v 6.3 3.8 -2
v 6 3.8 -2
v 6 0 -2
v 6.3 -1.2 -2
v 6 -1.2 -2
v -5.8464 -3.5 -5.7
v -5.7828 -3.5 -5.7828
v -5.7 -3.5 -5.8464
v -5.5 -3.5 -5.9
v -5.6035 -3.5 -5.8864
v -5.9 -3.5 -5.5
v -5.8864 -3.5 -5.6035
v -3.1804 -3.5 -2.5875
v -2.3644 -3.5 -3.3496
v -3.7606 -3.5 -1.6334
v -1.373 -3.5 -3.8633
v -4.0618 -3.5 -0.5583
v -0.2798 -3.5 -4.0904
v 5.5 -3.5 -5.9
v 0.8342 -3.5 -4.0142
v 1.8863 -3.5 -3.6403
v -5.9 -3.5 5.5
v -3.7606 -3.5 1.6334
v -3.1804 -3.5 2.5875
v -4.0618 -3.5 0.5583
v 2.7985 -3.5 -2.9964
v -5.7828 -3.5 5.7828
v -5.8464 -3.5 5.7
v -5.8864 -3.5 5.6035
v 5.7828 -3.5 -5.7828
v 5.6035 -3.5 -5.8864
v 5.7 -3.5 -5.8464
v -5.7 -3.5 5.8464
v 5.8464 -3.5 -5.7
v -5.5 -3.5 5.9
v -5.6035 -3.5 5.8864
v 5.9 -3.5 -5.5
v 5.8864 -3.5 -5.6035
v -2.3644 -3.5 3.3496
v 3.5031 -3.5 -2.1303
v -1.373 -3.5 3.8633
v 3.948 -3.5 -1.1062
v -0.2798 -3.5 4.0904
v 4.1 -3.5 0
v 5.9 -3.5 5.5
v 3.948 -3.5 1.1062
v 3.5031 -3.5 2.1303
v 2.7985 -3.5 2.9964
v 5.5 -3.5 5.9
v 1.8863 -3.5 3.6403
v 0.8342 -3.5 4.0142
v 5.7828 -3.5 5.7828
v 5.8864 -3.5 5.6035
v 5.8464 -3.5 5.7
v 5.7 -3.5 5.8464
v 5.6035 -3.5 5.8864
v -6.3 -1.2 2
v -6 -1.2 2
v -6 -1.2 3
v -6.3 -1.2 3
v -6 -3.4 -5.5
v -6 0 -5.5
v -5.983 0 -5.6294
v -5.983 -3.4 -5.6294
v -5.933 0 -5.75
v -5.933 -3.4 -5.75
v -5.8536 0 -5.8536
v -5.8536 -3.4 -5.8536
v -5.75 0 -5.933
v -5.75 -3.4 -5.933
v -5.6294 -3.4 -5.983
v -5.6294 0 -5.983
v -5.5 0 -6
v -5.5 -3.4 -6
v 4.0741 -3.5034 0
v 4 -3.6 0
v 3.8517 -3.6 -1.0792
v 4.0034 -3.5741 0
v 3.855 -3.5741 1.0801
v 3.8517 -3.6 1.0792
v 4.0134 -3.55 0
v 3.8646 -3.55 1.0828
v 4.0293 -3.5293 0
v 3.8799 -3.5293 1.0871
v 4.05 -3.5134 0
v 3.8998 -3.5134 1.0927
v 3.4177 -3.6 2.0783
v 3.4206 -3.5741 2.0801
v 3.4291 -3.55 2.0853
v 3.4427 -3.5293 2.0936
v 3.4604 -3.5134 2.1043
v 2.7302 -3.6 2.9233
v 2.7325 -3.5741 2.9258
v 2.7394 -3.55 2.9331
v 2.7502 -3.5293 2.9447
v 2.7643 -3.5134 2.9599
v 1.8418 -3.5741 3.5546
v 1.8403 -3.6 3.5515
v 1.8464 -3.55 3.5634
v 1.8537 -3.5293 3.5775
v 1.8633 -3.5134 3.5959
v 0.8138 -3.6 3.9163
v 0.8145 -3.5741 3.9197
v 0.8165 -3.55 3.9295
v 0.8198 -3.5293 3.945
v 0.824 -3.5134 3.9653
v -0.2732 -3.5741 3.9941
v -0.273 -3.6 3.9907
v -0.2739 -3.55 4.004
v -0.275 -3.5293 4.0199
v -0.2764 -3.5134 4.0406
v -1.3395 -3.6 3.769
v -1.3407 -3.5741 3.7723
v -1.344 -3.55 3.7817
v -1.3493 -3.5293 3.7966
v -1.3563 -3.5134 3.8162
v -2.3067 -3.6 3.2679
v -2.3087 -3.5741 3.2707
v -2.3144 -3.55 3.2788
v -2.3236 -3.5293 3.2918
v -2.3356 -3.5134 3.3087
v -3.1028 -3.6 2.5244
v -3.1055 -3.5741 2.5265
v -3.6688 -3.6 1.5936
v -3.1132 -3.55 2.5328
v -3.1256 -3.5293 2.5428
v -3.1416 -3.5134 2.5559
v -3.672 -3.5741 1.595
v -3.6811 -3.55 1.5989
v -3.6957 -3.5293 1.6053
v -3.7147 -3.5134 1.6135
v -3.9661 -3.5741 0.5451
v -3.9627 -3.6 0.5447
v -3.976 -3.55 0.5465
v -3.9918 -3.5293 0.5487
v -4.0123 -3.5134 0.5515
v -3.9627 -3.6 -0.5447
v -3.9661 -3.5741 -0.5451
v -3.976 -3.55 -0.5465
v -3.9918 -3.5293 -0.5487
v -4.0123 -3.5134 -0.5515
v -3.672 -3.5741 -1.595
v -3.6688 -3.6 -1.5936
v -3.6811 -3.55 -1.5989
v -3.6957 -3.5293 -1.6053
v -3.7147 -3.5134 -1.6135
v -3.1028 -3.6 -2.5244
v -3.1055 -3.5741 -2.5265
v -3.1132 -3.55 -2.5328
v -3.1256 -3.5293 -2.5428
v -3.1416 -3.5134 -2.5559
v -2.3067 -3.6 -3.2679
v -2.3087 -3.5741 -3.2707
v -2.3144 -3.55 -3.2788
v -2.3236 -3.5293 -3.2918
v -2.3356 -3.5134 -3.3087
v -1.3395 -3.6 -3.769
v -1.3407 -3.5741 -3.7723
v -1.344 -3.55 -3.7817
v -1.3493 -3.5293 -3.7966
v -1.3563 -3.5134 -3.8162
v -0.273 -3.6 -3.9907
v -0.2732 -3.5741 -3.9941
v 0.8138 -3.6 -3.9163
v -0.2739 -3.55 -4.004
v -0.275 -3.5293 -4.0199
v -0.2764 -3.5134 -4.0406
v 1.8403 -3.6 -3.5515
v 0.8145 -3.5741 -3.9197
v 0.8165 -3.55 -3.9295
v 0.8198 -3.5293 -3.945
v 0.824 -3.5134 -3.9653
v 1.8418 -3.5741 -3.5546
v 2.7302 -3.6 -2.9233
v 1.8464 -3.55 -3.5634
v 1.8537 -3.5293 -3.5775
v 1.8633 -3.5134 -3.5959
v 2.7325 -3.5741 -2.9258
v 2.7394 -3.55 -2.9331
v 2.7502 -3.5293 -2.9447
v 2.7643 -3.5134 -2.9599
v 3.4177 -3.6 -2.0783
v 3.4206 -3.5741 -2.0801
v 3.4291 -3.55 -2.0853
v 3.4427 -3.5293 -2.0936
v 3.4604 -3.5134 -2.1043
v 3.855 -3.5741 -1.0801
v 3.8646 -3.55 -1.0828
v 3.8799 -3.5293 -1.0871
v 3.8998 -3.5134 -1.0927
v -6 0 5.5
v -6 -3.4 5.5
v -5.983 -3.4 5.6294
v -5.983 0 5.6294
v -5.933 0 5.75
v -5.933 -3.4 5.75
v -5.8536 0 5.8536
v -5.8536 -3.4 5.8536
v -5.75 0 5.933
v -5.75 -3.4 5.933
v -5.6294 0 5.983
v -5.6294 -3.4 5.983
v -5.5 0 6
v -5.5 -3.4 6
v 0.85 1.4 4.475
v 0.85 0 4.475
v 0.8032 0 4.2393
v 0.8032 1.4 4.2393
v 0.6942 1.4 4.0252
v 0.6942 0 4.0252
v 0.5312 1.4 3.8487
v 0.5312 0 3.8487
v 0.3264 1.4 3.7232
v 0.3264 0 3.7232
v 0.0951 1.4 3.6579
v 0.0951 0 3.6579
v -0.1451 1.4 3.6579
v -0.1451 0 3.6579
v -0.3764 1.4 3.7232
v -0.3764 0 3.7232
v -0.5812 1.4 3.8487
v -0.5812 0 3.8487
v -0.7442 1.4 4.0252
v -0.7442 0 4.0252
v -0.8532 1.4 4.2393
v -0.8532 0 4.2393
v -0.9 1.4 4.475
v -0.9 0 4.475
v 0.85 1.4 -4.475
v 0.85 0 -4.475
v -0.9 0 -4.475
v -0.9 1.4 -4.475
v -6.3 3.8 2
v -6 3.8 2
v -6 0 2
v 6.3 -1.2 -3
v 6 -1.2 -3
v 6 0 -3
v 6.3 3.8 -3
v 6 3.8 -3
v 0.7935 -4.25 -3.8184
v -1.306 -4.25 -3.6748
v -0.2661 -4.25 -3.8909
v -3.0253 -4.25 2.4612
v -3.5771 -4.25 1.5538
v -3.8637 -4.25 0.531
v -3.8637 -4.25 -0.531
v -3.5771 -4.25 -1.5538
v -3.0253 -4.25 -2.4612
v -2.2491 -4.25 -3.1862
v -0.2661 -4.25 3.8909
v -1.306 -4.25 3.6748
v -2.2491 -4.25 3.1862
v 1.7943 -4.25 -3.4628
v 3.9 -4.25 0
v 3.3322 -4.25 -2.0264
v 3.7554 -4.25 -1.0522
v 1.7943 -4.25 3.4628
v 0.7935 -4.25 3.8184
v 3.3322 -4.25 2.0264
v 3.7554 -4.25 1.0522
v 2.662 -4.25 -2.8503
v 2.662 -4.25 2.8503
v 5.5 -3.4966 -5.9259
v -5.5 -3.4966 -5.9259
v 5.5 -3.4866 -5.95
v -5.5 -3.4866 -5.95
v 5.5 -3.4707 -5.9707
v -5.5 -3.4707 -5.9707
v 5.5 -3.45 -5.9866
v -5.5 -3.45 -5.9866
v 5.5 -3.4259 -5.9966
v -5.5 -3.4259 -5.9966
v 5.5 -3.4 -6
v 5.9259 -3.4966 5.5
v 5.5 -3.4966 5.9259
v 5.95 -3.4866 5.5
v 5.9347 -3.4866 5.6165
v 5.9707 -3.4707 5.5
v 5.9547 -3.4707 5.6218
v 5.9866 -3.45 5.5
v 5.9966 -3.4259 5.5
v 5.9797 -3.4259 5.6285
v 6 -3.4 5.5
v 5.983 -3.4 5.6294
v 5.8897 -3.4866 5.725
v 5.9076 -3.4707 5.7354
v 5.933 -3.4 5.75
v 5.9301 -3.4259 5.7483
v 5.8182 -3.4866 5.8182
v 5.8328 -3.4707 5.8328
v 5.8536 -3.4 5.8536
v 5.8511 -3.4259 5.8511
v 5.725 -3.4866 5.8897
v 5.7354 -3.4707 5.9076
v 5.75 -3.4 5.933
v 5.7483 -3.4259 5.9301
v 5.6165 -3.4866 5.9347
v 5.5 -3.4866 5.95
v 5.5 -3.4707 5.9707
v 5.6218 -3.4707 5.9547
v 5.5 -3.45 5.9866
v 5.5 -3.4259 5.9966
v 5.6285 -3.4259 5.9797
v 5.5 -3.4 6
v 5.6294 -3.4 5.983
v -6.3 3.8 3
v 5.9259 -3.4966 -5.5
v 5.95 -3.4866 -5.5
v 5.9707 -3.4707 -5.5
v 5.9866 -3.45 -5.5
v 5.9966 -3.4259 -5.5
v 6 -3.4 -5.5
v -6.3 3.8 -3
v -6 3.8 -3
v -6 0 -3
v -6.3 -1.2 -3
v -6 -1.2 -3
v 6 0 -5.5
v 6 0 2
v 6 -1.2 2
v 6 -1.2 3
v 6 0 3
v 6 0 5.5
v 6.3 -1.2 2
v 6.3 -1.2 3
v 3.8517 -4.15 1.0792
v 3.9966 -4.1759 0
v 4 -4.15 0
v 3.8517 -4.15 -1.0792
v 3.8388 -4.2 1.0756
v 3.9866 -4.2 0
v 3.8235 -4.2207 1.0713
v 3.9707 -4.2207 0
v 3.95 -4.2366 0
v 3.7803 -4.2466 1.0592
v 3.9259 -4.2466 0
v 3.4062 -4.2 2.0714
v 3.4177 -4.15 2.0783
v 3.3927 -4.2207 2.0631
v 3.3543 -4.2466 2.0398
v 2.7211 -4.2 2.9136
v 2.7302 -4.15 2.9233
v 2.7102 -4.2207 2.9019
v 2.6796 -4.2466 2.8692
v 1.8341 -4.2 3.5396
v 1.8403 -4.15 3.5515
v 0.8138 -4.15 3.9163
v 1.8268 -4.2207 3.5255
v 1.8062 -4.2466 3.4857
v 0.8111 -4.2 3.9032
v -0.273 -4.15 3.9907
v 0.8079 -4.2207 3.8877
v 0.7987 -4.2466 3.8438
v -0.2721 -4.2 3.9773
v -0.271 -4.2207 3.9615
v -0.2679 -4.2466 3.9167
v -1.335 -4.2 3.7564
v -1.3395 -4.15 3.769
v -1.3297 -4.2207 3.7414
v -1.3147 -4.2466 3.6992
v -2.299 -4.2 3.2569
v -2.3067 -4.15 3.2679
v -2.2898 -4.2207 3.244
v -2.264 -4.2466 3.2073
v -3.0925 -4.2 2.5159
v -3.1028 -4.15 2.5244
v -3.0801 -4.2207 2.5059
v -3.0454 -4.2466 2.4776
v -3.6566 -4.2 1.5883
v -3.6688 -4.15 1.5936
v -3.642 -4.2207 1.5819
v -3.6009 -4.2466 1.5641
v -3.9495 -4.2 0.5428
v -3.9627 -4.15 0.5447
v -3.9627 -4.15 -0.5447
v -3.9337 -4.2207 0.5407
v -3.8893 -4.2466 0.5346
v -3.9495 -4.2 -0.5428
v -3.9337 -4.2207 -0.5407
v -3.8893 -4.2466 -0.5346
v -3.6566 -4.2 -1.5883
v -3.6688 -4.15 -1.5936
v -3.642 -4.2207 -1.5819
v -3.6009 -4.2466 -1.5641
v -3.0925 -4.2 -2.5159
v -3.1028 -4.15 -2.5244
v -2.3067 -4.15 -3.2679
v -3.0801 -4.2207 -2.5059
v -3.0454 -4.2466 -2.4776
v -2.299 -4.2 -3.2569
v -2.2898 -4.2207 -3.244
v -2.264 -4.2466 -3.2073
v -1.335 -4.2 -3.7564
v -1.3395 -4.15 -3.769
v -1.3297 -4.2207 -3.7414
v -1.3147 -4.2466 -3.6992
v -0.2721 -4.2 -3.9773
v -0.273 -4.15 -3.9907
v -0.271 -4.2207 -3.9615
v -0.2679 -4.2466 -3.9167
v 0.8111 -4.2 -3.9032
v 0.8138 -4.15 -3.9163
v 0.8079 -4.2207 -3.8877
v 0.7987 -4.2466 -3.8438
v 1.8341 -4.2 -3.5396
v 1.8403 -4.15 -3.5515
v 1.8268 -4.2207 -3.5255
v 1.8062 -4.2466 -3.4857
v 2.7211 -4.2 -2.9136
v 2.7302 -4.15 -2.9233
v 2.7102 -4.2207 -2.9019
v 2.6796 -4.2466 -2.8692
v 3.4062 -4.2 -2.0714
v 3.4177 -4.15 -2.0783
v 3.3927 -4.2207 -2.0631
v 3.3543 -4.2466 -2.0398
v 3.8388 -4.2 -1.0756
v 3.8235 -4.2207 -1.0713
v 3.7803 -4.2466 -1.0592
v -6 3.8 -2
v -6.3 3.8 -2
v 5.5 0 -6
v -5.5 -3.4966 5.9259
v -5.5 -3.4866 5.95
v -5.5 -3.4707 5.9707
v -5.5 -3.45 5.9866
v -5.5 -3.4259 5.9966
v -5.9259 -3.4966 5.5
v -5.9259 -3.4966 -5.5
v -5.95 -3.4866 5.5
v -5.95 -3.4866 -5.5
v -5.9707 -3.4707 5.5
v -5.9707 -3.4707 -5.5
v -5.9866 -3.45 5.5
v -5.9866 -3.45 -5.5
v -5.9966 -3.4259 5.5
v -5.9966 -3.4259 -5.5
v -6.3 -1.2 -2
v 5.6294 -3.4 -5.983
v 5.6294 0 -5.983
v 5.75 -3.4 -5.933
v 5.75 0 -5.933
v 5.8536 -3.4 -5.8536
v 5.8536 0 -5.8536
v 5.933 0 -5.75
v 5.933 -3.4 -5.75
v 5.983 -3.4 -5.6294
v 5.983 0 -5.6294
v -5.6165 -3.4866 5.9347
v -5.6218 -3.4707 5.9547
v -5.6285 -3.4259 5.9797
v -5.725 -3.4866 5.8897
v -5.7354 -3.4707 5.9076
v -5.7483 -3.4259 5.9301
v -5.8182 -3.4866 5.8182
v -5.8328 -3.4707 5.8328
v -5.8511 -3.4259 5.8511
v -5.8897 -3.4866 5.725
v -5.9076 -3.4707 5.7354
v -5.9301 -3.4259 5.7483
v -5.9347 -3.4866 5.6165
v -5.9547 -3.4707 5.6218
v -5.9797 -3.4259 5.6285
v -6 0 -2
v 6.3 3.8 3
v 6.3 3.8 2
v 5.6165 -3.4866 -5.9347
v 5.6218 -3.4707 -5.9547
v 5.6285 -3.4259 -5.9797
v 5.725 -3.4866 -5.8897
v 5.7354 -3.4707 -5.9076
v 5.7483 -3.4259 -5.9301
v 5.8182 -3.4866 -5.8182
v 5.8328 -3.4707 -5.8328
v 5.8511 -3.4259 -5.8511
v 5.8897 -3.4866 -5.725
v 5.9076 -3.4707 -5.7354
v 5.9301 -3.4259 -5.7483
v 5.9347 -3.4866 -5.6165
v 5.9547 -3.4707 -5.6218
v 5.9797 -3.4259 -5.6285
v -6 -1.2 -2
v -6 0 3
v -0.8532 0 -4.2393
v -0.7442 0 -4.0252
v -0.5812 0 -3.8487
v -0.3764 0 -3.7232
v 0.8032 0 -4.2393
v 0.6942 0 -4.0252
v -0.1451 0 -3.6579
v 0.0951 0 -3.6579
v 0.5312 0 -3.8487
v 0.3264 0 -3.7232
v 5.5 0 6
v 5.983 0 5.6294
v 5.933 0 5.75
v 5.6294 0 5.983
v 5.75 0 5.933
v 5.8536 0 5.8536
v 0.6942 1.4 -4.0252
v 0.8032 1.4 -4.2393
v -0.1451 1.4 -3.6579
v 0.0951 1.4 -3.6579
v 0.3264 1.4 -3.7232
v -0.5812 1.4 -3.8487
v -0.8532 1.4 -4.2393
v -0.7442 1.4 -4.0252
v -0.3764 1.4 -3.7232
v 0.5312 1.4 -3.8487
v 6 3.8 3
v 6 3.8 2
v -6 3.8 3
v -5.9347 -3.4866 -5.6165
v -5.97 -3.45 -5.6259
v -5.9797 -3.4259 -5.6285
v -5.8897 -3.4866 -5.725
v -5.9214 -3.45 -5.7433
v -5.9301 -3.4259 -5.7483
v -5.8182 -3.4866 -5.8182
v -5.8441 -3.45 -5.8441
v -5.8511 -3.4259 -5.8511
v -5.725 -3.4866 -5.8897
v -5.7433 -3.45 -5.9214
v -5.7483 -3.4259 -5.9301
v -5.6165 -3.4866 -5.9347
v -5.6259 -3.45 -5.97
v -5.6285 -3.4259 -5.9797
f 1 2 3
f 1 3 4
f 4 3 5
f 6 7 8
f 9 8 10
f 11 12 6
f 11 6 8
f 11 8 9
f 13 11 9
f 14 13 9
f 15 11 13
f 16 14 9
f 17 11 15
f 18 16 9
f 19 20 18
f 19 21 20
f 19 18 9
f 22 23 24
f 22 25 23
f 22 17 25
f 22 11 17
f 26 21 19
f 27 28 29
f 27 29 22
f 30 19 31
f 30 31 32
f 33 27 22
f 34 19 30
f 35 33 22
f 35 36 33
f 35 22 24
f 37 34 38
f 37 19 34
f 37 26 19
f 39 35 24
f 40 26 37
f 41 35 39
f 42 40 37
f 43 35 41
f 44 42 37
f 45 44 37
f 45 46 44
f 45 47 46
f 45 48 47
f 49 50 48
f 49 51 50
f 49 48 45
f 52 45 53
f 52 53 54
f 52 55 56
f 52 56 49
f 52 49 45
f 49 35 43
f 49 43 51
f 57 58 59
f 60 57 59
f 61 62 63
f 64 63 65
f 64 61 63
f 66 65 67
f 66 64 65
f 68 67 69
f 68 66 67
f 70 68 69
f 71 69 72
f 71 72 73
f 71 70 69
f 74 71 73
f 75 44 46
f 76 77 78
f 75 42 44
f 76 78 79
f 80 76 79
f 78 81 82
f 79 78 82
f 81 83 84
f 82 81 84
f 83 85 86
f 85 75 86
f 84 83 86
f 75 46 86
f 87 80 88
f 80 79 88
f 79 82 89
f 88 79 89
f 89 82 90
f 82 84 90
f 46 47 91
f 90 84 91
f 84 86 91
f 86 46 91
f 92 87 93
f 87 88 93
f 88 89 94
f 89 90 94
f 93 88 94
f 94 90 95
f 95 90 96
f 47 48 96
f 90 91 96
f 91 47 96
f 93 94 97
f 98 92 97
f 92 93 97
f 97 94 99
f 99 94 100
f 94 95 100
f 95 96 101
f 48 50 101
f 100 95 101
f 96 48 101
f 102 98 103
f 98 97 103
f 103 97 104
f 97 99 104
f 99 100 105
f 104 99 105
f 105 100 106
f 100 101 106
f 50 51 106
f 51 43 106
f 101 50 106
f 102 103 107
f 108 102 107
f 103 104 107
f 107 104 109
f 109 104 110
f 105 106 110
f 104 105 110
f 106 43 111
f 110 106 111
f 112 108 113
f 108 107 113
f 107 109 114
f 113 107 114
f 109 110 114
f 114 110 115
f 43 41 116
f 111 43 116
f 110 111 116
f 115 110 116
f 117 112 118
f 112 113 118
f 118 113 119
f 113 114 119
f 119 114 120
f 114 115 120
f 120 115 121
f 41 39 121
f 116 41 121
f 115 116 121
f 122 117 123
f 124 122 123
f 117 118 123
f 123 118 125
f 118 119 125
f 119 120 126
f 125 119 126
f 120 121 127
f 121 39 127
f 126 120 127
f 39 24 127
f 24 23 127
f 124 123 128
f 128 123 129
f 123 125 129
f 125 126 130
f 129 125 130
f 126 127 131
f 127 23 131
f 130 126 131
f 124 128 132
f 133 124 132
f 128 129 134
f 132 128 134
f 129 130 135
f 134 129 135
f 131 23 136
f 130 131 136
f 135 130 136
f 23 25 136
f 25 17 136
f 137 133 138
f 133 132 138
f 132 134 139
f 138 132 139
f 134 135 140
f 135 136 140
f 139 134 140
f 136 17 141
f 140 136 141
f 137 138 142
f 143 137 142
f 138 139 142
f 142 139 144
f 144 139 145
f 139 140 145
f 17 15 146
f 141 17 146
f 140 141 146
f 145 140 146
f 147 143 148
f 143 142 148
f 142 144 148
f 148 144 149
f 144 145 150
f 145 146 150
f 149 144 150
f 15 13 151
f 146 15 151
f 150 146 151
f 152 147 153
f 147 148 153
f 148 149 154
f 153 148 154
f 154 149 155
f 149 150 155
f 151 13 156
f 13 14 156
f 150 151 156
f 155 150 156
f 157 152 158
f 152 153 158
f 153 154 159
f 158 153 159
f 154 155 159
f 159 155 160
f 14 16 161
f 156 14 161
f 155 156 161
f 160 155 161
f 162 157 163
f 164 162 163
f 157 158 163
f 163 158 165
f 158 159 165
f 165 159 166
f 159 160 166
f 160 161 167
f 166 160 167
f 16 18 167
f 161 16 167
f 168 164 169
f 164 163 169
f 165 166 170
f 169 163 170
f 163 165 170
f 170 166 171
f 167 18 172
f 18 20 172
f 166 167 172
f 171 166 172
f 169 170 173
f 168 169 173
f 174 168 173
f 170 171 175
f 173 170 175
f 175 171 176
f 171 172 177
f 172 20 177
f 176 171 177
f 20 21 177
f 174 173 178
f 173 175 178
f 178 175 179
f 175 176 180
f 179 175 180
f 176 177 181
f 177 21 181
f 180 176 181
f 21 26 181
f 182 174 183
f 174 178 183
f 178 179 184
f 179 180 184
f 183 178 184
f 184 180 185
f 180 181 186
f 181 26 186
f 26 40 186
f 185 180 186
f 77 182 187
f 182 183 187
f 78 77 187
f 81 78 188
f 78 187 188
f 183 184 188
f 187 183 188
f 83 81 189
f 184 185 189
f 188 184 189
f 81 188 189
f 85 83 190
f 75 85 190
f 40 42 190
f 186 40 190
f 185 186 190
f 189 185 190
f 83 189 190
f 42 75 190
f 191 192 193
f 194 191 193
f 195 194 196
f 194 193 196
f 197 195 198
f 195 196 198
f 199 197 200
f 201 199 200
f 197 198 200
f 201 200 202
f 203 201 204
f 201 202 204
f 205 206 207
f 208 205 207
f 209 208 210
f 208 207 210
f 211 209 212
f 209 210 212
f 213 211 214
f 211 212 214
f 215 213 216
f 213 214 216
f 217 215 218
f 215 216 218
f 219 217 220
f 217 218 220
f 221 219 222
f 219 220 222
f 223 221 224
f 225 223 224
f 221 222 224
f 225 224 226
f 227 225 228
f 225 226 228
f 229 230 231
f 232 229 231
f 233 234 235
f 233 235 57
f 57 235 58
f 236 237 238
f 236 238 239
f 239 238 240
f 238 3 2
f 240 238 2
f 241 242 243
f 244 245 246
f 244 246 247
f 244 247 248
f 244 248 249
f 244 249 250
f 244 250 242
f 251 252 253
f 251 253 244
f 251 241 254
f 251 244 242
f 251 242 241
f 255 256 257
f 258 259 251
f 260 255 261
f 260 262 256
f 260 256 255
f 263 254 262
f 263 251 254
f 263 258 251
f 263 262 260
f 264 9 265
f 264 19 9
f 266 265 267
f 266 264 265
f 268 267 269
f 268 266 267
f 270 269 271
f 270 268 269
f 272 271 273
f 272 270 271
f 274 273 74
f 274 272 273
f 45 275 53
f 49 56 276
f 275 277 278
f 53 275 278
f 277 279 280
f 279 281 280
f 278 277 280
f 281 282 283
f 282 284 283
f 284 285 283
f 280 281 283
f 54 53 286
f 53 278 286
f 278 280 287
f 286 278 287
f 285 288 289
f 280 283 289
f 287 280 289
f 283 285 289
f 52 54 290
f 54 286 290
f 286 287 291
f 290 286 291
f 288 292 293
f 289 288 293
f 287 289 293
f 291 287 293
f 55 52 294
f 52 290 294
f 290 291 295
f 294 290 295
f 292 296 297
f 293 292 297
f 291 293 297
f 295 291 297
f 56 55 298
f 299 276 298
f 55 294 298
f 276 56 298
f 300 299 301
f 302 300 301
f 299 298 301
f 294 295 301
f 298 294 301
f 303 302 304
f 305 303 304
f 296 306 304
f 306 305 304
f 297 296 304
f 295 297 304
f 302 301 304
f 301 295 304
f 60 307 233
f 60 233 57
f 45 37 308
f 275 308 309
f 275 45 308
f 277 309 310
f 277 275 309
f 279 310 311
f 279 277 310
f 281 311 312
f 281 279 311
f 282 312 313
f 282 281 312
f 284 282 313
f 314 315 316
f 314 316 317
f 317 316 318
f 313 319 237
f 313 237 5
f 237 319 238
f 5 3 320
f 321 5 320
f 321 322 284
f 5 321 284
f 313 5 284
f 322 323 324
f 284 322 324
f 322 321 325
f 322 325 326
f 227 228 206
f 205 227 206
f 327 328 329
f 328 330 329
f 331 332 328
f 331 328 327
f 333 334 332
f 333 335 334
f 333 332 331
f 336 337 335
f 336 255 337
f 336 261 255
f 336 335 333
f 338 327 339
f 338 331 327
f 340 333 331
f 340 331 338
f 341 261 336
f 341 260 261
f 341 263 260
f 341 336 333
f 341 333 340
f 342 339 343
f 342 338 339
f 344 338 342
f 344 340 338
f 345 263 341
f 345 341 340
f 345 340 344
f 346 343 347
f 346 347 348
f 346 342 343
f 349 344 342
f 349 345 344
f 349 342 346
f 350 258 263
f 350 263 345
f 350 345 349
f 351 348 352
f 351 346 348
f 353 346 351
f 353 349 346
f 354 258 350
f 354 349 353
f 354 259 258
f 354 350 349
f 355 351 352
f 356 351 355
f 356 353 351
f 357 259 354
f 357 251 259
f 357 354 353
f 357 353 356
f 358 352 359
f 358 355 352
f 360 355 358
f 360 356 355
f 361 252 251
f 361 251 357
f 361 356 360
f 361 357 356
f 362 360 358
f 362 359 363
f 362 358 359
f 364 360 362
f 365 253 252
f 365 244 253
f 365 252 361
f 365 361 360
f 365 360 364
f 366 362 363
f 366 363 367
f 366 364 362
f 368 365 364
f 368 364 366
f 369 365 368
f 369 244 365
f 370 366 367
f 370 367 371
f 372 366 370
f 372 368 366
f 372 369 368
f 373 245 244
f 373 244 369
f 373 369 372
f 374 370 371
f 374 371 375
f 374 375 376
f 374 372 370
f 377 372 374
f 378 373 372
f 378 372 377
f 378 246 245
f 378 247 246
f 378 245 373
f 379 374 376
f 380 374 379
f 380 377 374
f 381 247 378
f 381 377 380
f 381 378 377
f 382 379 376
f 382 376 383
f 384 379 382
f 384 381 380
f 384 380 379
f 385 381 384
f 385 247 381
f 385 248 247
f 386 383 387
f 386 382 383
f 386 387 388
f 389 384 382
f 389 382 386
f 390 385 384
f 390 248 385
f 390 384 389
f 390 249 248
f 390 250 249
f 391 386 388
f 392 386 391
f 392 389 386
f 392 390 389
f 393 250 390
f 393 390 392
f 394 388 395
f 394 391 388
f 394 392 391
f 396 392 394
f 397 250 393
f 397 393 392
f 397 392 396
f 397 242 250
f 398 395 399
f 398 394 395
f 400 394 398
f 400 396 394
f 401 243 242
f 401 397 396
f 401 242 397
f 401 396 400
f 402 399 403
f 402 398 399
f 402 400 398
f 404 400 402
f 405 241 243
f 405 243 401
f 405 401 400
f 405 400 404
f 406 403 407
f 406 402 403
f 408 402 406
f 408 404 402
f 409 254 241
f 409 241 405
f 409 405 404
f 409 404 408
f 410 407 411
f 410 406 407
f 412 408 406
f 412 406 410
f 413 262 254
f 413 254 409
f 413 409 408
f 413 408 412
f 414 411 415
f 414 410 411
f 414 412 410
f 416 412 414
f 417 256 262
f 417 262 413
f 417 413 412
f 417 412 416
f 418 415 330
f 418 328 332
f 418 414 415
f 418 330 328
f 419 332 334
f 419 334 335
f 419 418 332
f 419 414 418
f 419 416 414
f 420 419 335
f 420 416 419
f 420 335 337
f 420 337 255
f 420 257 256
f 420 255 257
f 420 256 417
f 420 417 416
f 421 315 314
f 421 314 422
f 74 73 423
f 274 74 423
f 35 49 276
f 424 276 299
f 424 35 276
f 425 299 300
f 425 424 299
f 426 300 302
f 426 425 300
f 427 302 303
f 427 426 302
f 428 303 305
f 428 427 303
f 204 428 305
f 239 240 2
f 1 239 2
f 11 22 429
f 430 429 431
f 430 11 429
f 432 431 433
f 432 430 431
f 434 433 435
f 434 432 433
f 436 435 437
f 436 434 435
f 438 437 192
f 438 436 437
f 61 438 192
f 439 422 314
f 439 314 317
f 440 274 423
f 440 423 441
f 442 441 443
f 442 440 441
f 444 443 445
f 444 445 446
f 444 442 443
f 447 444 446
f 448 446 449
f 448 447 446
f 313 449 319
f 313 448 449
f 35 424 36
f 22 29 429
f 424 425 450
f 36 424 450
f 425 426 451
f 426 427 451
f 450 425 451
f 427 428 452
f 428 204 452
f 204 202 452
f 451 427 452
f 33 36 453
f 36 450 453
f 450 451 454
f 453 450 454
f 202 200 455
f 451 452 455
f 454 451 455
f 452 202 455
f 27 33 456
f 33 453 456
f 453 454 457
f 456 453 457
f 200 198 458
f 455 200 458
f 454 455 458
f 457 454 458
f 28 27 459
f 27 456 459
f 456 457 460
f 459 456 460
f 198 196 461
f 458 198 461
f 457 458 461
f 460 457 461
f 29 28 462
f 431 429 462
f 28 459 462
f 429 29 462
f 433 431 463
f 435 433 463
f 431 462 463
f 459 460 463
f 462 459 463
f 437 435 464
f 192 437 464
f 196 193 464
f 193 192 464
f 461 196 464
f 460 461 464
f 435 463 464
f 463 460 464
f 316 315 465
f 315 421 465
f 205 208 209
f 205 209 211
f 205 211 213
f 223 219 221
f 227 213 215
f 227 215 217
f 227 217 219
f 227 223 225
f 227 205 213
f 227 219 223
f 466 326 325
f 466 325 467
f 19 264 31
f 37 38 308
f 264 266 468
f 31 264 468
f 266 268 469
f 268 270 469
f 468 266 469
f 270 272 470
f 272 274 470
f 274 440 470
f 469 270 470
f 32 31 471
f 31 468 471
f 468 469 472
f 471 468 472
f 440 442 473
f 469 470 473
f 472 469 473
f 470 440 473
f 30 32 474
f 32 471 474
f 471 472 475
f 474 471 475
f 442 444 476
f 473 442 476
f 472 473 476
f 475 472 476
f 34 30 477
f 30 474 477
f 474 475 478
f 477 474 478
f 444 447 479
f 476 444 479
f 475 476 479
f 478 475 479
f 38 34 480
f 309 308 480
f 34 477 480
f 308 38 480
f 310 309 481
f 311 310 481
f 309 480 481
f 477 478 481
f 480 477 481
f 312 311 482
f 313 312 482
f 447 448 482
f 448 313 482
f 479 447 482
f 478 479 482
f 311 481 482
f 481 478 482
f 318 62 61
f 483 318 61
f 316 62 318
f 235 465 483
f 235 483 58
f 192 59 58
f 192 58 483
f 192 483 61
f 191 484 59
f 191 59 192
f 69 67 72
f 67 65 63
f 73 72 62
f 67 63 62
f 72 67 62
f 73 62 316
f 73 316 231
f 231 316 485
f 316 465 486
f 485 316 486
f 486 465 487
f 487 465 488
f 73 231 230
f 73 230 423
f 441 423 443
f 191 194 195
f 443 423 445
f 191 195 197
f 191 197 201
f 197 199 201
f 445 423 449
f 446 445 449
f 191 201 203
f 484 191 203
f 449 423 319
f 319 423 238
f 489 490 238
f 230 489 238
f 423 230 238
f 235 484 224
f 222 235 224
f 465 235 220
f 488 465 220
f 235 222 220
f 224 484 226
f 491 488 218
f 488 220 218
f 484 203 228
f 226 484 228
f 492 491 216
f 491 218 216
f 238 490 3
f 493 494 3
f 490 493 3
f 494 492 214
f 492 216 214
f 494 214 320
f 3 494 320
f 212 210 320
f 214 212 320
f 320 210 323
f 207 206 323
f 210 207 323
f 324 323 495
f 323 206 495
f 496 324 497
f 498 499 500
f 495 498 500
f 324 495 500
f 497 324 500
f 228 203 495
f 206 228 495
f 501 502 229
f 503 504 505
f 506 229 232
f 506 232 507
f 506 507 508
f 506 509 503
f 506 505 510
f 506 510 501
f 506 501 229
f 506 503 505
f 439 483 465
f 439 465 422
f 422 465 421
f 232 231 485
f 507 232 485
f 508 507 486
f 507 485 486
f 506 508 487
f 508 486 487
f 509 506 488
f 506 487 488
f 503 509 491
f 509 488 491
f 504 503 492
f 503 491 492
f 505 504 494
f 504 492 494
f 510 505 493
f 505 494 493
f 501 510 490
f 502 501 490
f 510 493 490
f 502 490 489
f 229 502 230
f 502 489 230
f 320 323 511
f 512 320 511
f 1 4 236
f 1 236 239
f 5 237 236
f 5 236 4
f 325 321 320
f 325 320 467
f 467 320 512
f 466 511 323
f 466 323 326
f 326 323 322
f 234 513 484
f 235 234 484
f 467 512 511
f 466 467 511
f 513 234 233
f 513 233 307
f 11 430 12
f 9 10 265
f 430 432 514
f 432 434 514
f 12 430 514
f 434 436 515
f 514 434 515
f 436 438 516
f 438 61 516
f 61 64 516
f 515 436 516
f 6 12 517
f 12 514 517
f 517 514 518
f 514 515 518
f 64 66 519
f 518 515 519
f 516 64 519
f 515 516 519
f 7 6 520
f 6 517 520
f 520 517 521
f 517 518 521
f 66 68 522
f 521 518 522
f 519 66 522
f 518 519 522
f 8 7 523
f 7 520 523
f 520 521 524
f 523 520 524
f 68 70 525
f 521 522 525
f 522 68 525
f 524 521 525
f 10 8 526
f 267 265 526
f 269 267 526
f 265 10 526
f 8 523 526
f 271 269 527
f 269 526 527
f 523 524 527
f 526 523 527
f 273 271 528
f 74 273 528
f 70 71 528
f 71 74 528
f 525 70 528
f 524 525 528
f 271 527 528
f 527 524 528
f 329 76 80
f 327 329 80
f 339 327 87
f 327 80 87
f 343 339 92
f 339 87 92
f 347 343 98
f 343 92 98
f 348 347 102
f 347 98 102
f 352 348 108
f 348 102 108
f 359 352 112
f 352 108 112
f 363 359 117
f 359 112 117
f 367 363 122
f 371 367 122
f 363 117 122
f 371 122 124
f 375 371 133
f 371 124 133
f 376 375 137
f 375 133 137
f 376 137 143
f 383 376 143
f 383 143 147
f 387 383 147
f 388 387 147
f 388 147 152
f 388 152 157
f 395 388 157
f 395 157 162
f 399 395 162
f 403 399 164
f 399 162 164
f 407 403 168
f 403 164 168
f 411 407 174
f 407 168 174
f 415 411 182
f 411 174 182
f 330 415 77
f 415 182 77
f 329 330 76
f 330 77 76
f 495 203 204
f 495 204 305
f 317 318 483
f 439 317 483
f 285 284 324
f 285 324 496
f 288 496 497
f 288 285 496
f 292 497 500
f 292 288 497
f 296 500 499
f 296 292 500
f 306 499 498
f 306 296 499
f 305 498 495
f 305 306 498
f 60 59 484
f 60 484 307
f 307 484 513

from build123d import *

# Parameters (mm, degrees)
F0_W      = 12
F0_H      = 12
F1_DEPTH  = 3.5
F2_R      = 0.5
F3_R      = 4
F4_DEPTH  = 0.75
F5_R      = 0.1
F6_R      = 0.1
F7_W      = 3.8
F7_H      = 1
F7_W_2    = 1.2
F8_DEPTH  = 0.3
F9_W      = 1.2
F9_H      = 1
F9_W_2    = 3.8
F10_DEPTH = 0.3
F12_DEPTH = 1.4


with BuildPart() as f1:
    # F0 (on Front) → F1 (new body)
    with BuildSketch(Plane.XZ):
        Rectangle(F0_W, F0_H)
    extrude(amount=F1_DEPTH)

    # F2
    f2_edges = [f1.edges().sort_by_distance(p)[0] for p in [
        (6, -1.75, 6),
        (6, -1.75, -6),
        (-6, -1.75, -6),
        (-6, -1.75, 6),
    ]]
    fillet(f2_edges, radius=F2_R)

    # F3 (on face) → F4 (join)
    with BuildSketch(Plane.XZ.offset(3.5)):
        Circle(F3_R)
    extrude(amount=F4_DEPTH)

    # F5
    f5_edges = [f1.edges().sort_by_distance(p)[0] for p in [
        (-4, -4.25, 0),
    ]]
    fillet(f5_edges, radius=F5_R)

    # F6
    f6_edges = [f1.edges().sort_by_distance(p)[0] for p in [
        (0, -3.5, -6),
        (-5.853553, -3.5, -5.853553),
        (5.853553, -3.5, -5.853553),
        (-6, -3.5, 0),
        (6, -3.5, 0),
        (-5.853553, -3.5, 5.853553),
        (5.853553, -3.5, 5.853553),
        (0, -3.5, 6),
        (-4, -3.5, 0),
    ]]
    fillet(f6_edges, radius=F6_R)

    # F7 (on face) → F8 (join)
    with BuildSketch(Plane(origin=(-6, 0, 0), x_dir=(0, -1, 0), z_dir=(-1, 0, 0))):
        with Locations((-1.9, 2.5)):
            Rectangle(F7_W, F7_H)
        with Locations((0.6, 2.5)):
            Rectangle(F7_W_2, F7_H)
        with Locations((0.6, -2.5)):
            Rectangle(F7_W_2, F7_H)
        with Locations((-1.9, -2.5)):
            Rectangle(F7_W, F7_H)
    extrude(amount=F8_DEPTH)

    # F9 (on face) → F10 (join)
    with BuildSketch(Plane.YZ.offset(6)):
        with Locations((-0.6, 2.5)):
            Rectangle(F9_W, F9_H)
        with Locations((1.9, 2.5)):
            Rectangle(F9_W_2, F9_H)
        with Locations((-0.6, -2.5)):
            Rectangle(F9_W, F9_H)
        with Locations((1.9, -2.5)):
            Rectangle(F9_W_2, F9_H)
    extrude(amount=F10_DEPTH)

    # F11 (on face) → F12 (join)
    with BuildSketch(Plane(origin=(0, 0, 0), x_dir=(-1, 0, 0), z_dir=(0, 1, 0))):
        with BuildLine():
            Line((0.9, 4.475), (-0.85, 4.475))
            ThreePointArc((-0.85, 4.475), (0.025, 3.6496433929), (0.9, 4.475))
        make_face()
        with BuildLine():
            Line((-0.85, -4.475), (0.9, -4.475))
            ThreePointArc((0.9, -4.475), (0.025, -3.6496433929), (-0.85, -4.475))
        make_face()
    extrude(amount=F12_DEPTH)


solid = f1.part
